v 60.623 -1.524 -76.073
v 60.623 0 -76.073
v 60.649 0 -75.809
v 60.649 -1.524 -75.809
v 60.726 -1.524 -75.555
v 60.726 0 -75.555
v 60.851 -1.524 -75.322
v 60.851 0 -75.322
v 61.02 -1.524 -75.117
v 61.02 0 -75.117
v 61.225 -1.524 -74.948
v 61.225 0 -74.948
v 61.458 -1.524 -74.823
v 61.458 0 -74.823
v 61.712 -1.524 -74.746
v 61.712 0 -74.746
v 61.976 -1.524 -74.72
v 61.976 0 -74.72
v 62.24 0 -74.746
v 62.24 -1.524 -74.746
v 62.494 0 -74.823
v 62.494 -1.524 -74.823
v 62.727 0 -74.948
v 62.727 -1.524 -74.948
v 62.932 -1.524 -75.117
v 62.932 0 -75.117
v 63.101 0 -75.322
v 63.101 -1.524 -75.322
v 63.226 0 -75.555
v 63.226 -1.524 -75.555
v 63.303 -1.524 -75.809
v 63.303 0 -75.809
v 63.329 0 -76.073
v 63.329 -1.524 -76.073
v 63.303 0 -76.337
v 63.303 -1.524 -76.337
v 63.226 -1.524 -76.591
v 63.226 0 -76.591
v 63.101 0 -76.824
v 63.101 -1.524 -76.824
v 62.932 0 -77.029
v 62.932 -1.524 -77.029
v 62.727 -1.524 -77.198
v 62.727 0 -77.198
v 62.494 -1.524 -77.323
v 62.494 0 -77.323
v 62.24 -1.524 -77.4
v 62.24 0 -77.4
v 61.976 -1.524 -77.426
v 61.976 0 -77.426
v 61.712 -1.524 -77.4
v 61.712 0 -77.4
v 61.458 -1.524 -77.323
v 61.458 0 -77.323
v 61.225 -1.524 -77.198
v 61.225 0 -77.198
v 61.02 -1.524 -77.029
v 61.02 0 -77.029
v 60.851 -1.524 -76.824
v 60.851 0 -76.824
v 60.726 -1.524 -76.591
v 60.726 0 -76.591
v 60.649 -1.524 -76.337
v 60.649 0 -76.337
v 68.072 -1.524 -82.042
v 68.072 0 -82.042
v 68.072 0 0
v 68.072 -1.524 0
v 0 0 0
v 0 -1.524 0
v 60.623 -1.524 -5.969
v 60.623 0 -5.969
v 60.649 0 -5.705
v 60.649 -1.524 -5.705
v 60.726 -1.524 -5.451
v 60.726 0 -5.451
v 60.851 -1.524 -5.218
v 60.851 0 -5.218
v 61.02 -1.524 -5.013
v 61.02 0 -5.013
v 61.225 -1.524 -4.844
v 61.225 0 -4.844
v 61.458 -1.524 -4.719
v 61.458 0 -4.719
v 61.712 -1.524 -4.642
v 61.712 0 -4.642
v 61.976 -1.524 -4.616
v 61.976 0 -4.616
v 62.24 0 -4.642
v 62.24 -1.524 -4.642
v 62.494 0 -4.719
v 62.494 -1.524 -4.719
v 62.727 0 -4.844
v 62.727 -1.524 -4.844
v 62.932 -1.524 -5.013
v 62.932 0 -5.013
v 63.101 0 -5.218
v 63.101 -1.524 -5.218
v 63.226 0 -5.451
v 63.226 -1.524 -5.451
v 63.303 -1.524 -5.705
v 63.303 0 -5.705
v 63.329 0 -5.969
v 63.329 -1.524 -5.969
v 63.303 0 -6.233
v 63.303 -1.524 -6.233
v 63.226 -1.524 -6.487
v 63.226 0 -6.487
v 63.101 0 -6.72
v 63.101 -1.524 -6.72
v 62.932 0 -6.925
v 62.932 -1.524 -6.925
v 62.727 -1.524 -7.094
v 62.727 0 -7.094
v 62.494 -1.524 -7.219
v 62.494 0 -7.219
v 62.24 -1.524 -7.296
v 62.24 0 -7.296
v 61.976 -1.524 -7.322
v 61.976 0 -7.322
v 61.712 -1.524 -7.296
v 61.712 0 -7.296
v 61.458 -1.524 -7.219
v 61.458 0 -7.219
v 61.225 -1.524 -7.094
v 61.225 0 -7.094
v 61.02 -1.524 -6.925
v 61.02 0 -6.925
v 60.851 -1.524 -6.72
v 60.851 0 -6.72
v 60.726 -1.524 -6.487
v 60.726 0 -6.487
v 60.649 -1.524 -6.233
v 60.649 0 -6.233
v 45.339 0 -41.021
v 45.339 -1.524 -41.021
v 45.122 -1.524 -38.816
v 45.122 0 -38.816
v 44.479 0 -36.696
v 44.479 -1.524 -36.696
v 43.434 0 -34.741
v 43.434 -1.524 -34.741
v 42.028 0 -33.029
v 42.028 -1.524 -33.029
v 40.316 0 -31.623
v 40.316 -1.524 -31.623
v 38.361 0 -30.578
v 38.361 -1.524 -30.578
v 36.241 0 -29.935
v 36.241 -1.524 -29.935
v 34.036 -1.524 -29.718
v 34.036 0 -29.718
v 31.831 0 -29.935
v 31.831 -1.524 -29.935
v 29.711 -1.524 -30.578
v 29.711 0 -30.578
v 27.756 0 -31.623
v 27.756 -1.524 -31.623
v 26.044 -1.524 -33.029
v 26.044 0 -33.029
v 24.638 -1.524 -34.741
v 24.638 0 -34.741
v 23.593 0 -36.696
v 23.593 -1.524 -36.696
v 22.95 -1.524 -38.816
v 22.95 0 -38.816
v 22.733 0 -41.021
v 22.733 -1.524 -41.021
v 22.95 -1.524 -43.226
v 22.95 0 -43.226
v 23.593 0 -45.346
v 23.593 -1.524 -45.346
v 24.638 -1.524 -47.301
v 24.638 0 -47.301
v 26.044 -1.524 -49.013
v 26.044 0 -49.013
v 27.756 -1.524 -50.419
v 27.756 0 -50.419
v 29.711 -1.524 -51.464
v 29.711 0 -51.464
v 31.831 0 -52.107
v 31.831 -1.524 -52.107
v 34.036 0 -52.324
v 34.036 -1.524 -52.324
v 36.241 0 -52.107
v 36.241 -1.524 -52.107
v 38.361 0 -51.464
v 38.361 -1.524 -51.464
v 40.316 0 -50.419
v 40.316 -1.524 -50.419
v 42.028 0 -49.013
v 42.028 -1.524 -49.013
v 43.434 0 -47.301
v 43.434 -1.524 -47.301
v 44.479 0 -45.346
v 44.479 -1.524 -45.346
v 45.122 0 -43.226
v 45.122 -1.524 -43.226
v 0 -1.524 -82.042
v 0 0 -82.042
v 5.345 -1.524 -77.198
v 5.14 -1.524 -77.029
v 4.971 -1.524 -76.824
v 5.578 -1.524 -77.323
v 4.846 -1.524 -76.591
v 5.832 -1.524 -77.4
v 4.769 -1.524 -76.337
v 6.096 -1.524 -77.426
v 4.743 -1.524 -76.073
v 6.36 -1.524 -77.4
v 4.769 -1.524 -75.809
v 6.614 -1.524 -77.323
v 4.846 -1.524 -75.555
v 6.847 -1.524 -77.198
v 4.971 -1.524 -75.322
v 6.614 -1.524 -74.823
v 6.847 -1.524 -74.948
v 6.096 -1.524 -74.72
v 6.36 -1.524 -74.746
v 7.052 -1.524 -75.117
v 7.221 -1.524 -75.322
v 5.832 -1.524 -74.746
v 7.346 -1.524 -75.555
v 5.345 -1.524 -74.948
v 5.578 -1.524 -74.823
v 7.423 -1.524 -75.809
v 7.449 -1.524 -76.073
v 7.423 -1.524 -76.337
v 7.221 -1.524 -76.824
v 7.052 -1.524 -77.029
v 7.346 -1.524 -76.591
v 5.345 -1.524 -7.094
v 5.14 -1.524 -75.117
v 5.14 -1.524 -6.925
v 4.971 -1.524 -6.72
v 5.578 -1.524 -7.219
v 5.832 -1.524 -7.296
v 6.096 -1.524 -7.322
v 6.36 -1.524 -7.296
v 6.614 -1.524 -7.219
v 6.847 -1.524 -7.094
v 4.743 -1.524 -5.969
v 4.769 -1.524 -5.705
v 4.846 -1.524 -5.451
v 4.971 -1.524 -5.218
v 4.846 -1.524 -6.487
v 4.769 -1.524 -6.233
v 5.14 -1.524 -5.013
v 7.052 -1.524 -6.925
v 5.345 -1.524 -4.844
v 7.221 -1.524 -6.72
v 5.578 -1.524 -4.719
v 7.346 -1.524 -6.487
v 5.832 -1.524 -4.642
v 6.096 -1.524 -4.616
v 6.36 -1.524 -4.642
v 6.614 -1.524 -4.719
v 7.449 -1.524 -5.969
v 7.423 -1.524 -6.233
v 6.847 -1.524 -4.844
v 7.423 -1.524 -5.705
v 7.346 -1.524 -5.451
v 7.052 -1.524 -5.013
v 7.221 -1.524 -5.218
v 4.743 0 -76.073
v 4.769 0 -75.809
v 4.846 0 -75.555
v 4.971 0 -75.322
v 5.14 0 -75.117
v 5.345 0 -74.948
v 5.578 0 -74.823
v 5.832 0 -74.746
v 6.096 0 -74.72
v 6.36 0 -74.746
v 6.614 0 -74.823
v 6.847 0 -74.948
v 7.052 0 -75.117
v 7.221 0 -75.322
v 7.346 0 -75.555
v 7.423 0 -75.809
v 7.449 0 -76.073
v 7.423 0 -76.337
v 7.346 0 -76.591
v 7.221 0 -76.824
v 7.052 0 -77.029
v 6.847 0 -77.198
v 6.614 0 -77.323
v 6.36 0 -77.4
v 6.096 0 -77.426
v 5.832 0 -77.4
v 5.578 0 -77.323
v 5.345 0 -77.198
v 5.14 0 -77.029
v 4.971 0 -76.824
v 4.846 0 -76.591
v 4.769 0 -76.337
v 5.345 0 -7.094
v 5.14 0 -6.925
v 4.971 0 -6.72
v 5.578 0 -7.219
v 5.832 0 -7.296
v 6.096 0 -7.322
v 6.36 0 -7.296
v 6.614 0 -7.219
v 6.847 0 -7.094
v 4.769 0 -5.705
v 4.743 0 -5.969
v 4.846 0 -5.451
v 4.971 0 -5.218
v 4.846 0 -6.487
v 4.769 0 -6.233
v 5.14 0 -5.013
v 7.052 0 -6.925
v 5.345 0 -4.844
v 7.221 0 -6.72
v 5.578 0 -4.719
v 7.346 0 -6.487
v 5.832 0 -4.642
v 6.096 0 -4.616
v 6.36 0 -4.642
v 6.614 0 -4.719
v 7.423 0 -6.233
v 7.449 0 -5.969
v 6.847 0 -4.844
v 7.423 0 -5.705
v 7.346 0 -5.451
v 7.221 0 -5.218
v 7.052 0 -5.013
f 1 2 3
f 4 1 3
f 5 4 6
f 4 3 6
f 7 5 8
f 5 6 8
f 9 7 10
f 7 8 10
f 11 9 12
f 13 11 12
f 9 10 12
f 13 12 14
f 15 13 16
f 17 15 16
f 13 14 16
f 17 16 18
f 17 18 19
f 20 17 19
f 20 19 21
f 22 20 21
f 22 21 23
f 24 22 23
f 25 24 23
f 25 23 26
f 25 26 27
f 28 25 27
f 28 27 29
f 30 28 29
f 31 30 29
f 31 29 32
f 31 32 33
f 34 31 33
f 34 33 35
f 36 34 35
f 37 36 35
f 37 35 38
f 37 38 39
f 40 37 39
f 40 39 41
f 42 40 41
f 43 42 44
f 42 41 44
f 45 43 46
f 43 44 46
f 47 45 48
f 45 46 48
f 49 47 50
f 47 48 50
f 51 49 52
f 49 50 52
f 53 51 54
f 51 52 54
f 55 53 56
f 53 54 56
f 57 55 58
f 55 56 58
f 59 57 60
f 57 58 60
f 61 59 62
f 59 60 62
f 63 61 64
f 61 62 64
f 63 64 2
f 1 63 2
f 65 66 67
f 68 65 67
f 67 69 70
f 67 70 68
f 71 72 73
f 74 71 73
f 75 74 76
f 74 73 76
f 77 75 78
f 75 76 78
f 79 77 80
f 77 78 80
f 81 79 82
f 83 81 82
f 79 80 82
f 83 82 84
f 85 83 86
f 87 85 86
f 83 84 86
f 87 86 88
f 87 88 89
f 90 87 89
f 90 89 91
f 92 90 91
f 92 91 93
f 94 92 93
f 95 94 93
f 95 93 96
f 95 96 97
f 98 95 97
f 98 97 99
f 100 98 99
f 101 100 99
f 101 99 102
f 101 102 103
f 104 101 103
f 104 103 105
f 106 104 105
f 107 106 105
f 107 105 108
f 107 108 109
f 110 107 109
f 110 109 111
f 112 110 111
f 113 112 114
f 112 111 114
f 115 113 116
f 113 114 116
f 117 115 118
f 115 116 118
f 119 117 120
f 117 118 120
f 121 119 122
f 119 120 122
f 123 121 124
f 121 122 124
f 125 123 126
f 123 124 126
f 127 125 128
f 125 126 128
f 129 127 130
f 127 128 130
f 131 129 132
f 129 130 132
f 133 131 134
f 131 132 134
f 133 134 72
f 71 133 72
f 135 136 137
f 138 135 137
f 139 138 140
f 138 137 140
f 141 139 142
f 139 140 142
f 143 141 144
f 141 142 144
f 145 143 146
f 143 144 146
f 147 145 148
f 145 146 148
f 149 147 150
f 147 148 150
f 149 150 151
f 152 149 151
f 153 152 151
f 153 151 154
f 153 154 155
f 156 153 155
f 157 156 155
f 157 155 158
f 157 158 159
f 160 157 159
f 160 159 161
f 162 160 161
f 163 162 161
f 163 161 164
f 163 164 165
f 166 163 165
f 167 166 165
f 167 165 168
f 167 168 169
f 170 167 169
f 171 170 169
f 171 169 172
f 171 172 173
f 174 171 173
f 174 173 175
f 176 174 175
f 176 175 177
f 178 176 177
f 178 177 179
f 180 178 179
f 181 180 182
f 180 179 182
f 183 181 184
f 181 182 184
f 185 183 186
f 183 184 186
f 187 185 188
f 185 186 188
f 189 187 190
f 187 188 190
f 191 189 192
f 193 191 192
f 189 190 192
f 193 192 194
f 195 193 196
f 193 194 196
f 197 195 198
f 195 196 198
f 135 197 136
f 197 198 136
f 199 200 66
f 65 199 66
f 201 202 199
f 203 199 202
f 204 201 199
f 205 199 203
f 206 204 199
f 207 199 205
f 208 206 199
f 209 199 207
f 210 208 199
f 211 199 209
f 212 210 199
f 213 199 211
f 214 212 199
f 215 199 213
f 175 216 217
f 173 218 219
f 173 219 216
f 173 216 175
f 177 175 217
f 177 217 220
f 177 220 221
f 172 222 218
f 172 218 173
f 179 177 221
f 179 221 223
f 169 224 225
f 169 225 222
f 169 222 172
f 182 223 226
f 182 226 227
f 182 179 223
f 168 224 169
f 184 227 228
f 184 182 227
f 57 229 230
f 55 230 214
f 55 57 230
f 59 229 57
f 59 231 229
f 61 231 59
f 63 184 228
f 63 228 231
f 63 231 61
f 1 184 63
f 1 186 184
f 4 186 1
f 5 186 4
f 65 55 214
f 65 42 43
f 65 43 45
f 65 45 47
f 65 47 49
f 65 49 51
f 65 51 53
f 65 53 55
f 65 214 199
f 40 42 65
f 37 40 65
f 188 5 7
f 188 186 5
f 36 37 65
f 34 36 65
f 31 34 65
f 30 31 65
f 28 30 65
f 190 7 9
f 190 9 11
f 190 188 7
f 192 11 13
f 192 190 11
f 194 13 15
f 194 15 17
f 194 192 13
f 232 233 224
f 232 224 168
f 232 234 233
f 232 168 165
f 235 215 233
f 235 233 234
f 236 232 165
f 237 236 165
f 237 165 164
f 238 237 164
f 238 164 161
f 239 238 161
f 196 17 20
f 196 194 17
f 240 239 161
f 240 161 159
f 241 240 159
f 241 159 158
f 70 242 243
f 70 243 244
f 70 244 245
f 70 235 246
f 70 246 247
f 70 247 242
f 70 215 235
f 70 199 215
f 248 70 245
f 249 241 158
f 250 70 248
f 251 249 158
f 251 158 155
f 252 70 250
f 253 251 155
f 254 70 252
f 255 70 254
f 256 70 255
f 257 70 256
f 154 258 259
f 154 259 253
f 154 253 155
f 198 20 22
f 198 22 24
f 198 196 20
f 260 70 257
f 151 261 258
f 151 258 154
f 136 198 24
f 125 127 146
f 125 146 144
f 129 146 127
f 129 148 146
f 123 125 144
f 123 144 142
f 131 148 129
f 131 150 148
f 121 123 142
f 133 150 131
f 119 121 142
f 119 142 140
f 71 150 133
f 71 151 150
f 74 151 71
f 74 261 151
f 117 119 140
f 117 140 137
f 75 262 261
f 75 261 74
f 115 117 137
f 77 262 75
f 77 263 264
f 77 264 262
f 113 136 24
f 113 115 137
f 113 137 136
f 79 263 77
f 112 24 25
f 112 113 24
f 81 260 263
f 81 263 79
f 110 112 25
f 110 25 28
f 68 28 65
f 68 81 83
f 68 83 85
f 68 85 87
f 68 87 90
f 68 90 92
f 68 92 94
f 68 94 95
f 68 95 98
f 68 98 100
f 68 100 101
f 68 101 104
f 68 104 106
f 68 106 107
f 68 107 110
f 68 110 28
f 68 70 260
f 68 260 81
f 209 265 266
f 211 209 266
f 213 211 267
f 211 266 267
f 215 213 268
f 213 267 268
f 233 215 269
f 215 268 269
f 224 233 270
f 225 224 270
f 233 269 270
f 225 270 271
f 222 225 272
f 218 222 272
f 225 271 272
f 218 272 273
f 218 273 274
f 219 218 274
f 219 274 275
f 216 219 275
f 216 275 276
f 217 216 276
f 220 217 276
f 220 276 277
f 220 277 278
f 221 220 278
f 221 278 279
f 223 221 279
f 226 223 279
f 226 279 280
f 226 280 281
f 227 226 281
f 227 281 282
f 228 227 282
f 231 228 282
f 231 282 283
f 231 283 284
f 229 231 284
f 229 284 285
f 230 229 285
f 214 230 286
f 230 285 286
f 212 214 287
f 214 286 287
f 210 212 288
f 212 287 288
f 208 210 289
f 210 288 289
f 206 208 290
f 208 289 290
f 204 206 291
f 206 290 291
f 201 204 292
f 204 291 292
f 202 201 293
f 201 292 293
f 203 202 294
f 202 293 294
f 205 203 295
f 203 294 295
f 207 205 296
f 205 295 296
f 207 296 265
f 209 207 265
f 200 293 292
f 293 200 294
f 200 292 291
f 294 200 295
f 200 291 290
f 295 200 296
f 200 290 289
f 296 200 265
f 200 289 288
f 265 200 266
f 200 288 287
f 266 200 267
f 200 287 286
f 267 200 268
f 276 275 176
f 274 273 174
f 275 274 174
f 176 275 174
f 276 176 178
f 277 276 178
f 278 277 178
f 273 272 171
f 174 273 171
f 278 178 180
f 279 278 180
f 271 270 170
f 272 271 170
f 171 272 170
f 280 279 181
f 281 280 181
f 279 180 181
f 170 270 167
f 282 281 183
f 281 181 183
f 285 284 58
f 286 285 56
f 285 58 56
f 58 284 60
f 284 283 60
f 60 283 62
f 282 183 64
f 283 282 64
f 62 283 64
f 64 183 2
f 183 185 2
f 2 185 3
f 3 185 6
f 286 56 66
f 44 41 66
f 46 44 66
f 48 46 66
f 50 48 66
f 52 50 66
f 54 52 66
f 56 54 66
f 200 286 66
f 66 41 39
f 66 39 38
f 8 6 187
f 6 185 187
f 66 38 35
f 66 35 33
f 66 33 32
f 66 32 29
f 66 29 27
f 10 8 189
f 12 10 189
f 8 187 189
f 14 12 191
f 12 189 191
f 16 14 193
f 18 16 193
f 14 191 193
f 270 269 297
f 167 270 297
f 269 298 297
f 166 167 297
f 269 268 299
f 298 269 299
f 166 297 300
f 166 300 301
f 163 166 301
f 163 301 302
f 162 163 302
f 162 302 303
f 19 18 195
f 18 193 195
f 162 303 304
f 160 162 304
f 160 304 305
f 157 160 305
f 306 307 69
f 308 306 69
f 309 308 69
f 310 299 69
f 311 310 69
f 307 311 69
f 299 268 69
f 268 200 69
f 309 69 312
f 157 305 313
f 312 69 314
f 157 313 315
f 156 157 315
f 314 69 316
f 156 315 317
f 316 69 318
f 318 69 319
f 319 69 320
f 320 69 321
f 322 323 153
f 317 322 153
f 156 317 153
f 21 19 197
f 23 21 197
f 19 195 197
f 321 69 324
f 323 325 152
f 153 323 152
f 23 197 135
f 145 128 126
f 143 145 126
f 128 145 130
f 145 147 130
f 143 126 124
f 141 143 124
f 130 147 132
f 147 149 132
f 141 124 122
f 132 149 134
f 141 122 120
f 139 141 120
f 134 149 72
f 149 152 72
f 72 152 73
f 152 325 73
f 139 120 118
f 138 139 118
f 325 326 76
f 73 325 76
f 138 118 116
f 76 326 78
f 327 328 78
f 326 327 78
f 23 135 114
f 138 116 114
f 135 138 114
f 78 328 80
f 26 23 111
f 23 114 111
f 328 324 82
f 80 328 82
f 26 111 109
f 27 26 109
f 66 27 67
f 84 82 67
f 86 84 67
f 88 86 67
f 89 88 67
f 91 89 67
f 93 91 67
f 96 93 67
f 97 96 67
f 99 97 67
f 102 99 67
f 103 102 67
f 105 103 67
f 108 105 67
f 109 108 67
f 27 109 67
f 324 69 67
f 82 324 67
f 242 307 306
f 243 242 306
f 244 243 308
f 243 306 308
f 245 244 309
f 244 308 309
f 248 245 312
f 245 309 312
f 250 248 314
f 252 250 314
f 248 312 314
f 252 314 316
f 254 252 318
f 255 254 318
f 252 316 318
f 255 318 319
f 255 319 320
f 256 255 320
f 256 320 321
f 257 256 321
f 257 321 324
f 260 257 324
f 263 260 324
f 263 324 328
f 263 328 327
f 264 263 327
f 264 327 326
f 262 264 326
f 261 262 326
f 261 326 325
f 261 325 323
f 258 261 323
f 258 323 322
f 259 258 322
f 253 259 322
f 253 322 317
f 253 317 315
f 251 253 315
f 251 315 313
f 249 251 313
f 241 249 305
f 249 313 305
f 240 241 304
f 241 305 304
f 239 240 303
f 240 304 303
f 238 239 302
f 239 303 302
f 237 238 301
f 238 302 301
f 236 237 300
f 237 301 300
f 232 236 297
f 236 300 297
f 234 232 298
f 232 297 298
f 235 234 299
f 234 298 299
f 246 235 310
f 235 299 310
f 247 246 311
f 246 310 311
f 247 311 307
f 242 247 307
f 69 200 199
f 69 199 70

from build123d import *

# Parameters (mm, degrees)
F0_W     = 68.072
F0_H     = 82.042
F1_DEPTH = 1.524
F3_D     = 2.7051
F4_R     = 11.303
F5_DEPTH = 1.525


with BuildPart() as f1:
    # F0 (on Front) → F1 (new body)
    with BuildSketch(Plane.XZ):
        with Locations((34.036, -41.021)):
            Rectangle(F0_W, F0_H)
    extrude(amount=F1_DEPTH)

    # F3 (through all)
    with Locations(Plane.XZ.offset(1.524)):
        with Locations((6.096, -5.969), (61.976, -5.969), (61.976, -76.073), (6.096, -76.073)):
            Hole(F3_D / 2)

    # F4 (on face) → F5 (cut, through all)
    with BuildSketch(Plane.XZ.offset(1.524)):
        with Locations((34.036, -41.021)):
            Circle(F4_R)
    extrude(amount=-F5_DEPTH, mode=Mode.SUBTRACT)


solid = f1.part
